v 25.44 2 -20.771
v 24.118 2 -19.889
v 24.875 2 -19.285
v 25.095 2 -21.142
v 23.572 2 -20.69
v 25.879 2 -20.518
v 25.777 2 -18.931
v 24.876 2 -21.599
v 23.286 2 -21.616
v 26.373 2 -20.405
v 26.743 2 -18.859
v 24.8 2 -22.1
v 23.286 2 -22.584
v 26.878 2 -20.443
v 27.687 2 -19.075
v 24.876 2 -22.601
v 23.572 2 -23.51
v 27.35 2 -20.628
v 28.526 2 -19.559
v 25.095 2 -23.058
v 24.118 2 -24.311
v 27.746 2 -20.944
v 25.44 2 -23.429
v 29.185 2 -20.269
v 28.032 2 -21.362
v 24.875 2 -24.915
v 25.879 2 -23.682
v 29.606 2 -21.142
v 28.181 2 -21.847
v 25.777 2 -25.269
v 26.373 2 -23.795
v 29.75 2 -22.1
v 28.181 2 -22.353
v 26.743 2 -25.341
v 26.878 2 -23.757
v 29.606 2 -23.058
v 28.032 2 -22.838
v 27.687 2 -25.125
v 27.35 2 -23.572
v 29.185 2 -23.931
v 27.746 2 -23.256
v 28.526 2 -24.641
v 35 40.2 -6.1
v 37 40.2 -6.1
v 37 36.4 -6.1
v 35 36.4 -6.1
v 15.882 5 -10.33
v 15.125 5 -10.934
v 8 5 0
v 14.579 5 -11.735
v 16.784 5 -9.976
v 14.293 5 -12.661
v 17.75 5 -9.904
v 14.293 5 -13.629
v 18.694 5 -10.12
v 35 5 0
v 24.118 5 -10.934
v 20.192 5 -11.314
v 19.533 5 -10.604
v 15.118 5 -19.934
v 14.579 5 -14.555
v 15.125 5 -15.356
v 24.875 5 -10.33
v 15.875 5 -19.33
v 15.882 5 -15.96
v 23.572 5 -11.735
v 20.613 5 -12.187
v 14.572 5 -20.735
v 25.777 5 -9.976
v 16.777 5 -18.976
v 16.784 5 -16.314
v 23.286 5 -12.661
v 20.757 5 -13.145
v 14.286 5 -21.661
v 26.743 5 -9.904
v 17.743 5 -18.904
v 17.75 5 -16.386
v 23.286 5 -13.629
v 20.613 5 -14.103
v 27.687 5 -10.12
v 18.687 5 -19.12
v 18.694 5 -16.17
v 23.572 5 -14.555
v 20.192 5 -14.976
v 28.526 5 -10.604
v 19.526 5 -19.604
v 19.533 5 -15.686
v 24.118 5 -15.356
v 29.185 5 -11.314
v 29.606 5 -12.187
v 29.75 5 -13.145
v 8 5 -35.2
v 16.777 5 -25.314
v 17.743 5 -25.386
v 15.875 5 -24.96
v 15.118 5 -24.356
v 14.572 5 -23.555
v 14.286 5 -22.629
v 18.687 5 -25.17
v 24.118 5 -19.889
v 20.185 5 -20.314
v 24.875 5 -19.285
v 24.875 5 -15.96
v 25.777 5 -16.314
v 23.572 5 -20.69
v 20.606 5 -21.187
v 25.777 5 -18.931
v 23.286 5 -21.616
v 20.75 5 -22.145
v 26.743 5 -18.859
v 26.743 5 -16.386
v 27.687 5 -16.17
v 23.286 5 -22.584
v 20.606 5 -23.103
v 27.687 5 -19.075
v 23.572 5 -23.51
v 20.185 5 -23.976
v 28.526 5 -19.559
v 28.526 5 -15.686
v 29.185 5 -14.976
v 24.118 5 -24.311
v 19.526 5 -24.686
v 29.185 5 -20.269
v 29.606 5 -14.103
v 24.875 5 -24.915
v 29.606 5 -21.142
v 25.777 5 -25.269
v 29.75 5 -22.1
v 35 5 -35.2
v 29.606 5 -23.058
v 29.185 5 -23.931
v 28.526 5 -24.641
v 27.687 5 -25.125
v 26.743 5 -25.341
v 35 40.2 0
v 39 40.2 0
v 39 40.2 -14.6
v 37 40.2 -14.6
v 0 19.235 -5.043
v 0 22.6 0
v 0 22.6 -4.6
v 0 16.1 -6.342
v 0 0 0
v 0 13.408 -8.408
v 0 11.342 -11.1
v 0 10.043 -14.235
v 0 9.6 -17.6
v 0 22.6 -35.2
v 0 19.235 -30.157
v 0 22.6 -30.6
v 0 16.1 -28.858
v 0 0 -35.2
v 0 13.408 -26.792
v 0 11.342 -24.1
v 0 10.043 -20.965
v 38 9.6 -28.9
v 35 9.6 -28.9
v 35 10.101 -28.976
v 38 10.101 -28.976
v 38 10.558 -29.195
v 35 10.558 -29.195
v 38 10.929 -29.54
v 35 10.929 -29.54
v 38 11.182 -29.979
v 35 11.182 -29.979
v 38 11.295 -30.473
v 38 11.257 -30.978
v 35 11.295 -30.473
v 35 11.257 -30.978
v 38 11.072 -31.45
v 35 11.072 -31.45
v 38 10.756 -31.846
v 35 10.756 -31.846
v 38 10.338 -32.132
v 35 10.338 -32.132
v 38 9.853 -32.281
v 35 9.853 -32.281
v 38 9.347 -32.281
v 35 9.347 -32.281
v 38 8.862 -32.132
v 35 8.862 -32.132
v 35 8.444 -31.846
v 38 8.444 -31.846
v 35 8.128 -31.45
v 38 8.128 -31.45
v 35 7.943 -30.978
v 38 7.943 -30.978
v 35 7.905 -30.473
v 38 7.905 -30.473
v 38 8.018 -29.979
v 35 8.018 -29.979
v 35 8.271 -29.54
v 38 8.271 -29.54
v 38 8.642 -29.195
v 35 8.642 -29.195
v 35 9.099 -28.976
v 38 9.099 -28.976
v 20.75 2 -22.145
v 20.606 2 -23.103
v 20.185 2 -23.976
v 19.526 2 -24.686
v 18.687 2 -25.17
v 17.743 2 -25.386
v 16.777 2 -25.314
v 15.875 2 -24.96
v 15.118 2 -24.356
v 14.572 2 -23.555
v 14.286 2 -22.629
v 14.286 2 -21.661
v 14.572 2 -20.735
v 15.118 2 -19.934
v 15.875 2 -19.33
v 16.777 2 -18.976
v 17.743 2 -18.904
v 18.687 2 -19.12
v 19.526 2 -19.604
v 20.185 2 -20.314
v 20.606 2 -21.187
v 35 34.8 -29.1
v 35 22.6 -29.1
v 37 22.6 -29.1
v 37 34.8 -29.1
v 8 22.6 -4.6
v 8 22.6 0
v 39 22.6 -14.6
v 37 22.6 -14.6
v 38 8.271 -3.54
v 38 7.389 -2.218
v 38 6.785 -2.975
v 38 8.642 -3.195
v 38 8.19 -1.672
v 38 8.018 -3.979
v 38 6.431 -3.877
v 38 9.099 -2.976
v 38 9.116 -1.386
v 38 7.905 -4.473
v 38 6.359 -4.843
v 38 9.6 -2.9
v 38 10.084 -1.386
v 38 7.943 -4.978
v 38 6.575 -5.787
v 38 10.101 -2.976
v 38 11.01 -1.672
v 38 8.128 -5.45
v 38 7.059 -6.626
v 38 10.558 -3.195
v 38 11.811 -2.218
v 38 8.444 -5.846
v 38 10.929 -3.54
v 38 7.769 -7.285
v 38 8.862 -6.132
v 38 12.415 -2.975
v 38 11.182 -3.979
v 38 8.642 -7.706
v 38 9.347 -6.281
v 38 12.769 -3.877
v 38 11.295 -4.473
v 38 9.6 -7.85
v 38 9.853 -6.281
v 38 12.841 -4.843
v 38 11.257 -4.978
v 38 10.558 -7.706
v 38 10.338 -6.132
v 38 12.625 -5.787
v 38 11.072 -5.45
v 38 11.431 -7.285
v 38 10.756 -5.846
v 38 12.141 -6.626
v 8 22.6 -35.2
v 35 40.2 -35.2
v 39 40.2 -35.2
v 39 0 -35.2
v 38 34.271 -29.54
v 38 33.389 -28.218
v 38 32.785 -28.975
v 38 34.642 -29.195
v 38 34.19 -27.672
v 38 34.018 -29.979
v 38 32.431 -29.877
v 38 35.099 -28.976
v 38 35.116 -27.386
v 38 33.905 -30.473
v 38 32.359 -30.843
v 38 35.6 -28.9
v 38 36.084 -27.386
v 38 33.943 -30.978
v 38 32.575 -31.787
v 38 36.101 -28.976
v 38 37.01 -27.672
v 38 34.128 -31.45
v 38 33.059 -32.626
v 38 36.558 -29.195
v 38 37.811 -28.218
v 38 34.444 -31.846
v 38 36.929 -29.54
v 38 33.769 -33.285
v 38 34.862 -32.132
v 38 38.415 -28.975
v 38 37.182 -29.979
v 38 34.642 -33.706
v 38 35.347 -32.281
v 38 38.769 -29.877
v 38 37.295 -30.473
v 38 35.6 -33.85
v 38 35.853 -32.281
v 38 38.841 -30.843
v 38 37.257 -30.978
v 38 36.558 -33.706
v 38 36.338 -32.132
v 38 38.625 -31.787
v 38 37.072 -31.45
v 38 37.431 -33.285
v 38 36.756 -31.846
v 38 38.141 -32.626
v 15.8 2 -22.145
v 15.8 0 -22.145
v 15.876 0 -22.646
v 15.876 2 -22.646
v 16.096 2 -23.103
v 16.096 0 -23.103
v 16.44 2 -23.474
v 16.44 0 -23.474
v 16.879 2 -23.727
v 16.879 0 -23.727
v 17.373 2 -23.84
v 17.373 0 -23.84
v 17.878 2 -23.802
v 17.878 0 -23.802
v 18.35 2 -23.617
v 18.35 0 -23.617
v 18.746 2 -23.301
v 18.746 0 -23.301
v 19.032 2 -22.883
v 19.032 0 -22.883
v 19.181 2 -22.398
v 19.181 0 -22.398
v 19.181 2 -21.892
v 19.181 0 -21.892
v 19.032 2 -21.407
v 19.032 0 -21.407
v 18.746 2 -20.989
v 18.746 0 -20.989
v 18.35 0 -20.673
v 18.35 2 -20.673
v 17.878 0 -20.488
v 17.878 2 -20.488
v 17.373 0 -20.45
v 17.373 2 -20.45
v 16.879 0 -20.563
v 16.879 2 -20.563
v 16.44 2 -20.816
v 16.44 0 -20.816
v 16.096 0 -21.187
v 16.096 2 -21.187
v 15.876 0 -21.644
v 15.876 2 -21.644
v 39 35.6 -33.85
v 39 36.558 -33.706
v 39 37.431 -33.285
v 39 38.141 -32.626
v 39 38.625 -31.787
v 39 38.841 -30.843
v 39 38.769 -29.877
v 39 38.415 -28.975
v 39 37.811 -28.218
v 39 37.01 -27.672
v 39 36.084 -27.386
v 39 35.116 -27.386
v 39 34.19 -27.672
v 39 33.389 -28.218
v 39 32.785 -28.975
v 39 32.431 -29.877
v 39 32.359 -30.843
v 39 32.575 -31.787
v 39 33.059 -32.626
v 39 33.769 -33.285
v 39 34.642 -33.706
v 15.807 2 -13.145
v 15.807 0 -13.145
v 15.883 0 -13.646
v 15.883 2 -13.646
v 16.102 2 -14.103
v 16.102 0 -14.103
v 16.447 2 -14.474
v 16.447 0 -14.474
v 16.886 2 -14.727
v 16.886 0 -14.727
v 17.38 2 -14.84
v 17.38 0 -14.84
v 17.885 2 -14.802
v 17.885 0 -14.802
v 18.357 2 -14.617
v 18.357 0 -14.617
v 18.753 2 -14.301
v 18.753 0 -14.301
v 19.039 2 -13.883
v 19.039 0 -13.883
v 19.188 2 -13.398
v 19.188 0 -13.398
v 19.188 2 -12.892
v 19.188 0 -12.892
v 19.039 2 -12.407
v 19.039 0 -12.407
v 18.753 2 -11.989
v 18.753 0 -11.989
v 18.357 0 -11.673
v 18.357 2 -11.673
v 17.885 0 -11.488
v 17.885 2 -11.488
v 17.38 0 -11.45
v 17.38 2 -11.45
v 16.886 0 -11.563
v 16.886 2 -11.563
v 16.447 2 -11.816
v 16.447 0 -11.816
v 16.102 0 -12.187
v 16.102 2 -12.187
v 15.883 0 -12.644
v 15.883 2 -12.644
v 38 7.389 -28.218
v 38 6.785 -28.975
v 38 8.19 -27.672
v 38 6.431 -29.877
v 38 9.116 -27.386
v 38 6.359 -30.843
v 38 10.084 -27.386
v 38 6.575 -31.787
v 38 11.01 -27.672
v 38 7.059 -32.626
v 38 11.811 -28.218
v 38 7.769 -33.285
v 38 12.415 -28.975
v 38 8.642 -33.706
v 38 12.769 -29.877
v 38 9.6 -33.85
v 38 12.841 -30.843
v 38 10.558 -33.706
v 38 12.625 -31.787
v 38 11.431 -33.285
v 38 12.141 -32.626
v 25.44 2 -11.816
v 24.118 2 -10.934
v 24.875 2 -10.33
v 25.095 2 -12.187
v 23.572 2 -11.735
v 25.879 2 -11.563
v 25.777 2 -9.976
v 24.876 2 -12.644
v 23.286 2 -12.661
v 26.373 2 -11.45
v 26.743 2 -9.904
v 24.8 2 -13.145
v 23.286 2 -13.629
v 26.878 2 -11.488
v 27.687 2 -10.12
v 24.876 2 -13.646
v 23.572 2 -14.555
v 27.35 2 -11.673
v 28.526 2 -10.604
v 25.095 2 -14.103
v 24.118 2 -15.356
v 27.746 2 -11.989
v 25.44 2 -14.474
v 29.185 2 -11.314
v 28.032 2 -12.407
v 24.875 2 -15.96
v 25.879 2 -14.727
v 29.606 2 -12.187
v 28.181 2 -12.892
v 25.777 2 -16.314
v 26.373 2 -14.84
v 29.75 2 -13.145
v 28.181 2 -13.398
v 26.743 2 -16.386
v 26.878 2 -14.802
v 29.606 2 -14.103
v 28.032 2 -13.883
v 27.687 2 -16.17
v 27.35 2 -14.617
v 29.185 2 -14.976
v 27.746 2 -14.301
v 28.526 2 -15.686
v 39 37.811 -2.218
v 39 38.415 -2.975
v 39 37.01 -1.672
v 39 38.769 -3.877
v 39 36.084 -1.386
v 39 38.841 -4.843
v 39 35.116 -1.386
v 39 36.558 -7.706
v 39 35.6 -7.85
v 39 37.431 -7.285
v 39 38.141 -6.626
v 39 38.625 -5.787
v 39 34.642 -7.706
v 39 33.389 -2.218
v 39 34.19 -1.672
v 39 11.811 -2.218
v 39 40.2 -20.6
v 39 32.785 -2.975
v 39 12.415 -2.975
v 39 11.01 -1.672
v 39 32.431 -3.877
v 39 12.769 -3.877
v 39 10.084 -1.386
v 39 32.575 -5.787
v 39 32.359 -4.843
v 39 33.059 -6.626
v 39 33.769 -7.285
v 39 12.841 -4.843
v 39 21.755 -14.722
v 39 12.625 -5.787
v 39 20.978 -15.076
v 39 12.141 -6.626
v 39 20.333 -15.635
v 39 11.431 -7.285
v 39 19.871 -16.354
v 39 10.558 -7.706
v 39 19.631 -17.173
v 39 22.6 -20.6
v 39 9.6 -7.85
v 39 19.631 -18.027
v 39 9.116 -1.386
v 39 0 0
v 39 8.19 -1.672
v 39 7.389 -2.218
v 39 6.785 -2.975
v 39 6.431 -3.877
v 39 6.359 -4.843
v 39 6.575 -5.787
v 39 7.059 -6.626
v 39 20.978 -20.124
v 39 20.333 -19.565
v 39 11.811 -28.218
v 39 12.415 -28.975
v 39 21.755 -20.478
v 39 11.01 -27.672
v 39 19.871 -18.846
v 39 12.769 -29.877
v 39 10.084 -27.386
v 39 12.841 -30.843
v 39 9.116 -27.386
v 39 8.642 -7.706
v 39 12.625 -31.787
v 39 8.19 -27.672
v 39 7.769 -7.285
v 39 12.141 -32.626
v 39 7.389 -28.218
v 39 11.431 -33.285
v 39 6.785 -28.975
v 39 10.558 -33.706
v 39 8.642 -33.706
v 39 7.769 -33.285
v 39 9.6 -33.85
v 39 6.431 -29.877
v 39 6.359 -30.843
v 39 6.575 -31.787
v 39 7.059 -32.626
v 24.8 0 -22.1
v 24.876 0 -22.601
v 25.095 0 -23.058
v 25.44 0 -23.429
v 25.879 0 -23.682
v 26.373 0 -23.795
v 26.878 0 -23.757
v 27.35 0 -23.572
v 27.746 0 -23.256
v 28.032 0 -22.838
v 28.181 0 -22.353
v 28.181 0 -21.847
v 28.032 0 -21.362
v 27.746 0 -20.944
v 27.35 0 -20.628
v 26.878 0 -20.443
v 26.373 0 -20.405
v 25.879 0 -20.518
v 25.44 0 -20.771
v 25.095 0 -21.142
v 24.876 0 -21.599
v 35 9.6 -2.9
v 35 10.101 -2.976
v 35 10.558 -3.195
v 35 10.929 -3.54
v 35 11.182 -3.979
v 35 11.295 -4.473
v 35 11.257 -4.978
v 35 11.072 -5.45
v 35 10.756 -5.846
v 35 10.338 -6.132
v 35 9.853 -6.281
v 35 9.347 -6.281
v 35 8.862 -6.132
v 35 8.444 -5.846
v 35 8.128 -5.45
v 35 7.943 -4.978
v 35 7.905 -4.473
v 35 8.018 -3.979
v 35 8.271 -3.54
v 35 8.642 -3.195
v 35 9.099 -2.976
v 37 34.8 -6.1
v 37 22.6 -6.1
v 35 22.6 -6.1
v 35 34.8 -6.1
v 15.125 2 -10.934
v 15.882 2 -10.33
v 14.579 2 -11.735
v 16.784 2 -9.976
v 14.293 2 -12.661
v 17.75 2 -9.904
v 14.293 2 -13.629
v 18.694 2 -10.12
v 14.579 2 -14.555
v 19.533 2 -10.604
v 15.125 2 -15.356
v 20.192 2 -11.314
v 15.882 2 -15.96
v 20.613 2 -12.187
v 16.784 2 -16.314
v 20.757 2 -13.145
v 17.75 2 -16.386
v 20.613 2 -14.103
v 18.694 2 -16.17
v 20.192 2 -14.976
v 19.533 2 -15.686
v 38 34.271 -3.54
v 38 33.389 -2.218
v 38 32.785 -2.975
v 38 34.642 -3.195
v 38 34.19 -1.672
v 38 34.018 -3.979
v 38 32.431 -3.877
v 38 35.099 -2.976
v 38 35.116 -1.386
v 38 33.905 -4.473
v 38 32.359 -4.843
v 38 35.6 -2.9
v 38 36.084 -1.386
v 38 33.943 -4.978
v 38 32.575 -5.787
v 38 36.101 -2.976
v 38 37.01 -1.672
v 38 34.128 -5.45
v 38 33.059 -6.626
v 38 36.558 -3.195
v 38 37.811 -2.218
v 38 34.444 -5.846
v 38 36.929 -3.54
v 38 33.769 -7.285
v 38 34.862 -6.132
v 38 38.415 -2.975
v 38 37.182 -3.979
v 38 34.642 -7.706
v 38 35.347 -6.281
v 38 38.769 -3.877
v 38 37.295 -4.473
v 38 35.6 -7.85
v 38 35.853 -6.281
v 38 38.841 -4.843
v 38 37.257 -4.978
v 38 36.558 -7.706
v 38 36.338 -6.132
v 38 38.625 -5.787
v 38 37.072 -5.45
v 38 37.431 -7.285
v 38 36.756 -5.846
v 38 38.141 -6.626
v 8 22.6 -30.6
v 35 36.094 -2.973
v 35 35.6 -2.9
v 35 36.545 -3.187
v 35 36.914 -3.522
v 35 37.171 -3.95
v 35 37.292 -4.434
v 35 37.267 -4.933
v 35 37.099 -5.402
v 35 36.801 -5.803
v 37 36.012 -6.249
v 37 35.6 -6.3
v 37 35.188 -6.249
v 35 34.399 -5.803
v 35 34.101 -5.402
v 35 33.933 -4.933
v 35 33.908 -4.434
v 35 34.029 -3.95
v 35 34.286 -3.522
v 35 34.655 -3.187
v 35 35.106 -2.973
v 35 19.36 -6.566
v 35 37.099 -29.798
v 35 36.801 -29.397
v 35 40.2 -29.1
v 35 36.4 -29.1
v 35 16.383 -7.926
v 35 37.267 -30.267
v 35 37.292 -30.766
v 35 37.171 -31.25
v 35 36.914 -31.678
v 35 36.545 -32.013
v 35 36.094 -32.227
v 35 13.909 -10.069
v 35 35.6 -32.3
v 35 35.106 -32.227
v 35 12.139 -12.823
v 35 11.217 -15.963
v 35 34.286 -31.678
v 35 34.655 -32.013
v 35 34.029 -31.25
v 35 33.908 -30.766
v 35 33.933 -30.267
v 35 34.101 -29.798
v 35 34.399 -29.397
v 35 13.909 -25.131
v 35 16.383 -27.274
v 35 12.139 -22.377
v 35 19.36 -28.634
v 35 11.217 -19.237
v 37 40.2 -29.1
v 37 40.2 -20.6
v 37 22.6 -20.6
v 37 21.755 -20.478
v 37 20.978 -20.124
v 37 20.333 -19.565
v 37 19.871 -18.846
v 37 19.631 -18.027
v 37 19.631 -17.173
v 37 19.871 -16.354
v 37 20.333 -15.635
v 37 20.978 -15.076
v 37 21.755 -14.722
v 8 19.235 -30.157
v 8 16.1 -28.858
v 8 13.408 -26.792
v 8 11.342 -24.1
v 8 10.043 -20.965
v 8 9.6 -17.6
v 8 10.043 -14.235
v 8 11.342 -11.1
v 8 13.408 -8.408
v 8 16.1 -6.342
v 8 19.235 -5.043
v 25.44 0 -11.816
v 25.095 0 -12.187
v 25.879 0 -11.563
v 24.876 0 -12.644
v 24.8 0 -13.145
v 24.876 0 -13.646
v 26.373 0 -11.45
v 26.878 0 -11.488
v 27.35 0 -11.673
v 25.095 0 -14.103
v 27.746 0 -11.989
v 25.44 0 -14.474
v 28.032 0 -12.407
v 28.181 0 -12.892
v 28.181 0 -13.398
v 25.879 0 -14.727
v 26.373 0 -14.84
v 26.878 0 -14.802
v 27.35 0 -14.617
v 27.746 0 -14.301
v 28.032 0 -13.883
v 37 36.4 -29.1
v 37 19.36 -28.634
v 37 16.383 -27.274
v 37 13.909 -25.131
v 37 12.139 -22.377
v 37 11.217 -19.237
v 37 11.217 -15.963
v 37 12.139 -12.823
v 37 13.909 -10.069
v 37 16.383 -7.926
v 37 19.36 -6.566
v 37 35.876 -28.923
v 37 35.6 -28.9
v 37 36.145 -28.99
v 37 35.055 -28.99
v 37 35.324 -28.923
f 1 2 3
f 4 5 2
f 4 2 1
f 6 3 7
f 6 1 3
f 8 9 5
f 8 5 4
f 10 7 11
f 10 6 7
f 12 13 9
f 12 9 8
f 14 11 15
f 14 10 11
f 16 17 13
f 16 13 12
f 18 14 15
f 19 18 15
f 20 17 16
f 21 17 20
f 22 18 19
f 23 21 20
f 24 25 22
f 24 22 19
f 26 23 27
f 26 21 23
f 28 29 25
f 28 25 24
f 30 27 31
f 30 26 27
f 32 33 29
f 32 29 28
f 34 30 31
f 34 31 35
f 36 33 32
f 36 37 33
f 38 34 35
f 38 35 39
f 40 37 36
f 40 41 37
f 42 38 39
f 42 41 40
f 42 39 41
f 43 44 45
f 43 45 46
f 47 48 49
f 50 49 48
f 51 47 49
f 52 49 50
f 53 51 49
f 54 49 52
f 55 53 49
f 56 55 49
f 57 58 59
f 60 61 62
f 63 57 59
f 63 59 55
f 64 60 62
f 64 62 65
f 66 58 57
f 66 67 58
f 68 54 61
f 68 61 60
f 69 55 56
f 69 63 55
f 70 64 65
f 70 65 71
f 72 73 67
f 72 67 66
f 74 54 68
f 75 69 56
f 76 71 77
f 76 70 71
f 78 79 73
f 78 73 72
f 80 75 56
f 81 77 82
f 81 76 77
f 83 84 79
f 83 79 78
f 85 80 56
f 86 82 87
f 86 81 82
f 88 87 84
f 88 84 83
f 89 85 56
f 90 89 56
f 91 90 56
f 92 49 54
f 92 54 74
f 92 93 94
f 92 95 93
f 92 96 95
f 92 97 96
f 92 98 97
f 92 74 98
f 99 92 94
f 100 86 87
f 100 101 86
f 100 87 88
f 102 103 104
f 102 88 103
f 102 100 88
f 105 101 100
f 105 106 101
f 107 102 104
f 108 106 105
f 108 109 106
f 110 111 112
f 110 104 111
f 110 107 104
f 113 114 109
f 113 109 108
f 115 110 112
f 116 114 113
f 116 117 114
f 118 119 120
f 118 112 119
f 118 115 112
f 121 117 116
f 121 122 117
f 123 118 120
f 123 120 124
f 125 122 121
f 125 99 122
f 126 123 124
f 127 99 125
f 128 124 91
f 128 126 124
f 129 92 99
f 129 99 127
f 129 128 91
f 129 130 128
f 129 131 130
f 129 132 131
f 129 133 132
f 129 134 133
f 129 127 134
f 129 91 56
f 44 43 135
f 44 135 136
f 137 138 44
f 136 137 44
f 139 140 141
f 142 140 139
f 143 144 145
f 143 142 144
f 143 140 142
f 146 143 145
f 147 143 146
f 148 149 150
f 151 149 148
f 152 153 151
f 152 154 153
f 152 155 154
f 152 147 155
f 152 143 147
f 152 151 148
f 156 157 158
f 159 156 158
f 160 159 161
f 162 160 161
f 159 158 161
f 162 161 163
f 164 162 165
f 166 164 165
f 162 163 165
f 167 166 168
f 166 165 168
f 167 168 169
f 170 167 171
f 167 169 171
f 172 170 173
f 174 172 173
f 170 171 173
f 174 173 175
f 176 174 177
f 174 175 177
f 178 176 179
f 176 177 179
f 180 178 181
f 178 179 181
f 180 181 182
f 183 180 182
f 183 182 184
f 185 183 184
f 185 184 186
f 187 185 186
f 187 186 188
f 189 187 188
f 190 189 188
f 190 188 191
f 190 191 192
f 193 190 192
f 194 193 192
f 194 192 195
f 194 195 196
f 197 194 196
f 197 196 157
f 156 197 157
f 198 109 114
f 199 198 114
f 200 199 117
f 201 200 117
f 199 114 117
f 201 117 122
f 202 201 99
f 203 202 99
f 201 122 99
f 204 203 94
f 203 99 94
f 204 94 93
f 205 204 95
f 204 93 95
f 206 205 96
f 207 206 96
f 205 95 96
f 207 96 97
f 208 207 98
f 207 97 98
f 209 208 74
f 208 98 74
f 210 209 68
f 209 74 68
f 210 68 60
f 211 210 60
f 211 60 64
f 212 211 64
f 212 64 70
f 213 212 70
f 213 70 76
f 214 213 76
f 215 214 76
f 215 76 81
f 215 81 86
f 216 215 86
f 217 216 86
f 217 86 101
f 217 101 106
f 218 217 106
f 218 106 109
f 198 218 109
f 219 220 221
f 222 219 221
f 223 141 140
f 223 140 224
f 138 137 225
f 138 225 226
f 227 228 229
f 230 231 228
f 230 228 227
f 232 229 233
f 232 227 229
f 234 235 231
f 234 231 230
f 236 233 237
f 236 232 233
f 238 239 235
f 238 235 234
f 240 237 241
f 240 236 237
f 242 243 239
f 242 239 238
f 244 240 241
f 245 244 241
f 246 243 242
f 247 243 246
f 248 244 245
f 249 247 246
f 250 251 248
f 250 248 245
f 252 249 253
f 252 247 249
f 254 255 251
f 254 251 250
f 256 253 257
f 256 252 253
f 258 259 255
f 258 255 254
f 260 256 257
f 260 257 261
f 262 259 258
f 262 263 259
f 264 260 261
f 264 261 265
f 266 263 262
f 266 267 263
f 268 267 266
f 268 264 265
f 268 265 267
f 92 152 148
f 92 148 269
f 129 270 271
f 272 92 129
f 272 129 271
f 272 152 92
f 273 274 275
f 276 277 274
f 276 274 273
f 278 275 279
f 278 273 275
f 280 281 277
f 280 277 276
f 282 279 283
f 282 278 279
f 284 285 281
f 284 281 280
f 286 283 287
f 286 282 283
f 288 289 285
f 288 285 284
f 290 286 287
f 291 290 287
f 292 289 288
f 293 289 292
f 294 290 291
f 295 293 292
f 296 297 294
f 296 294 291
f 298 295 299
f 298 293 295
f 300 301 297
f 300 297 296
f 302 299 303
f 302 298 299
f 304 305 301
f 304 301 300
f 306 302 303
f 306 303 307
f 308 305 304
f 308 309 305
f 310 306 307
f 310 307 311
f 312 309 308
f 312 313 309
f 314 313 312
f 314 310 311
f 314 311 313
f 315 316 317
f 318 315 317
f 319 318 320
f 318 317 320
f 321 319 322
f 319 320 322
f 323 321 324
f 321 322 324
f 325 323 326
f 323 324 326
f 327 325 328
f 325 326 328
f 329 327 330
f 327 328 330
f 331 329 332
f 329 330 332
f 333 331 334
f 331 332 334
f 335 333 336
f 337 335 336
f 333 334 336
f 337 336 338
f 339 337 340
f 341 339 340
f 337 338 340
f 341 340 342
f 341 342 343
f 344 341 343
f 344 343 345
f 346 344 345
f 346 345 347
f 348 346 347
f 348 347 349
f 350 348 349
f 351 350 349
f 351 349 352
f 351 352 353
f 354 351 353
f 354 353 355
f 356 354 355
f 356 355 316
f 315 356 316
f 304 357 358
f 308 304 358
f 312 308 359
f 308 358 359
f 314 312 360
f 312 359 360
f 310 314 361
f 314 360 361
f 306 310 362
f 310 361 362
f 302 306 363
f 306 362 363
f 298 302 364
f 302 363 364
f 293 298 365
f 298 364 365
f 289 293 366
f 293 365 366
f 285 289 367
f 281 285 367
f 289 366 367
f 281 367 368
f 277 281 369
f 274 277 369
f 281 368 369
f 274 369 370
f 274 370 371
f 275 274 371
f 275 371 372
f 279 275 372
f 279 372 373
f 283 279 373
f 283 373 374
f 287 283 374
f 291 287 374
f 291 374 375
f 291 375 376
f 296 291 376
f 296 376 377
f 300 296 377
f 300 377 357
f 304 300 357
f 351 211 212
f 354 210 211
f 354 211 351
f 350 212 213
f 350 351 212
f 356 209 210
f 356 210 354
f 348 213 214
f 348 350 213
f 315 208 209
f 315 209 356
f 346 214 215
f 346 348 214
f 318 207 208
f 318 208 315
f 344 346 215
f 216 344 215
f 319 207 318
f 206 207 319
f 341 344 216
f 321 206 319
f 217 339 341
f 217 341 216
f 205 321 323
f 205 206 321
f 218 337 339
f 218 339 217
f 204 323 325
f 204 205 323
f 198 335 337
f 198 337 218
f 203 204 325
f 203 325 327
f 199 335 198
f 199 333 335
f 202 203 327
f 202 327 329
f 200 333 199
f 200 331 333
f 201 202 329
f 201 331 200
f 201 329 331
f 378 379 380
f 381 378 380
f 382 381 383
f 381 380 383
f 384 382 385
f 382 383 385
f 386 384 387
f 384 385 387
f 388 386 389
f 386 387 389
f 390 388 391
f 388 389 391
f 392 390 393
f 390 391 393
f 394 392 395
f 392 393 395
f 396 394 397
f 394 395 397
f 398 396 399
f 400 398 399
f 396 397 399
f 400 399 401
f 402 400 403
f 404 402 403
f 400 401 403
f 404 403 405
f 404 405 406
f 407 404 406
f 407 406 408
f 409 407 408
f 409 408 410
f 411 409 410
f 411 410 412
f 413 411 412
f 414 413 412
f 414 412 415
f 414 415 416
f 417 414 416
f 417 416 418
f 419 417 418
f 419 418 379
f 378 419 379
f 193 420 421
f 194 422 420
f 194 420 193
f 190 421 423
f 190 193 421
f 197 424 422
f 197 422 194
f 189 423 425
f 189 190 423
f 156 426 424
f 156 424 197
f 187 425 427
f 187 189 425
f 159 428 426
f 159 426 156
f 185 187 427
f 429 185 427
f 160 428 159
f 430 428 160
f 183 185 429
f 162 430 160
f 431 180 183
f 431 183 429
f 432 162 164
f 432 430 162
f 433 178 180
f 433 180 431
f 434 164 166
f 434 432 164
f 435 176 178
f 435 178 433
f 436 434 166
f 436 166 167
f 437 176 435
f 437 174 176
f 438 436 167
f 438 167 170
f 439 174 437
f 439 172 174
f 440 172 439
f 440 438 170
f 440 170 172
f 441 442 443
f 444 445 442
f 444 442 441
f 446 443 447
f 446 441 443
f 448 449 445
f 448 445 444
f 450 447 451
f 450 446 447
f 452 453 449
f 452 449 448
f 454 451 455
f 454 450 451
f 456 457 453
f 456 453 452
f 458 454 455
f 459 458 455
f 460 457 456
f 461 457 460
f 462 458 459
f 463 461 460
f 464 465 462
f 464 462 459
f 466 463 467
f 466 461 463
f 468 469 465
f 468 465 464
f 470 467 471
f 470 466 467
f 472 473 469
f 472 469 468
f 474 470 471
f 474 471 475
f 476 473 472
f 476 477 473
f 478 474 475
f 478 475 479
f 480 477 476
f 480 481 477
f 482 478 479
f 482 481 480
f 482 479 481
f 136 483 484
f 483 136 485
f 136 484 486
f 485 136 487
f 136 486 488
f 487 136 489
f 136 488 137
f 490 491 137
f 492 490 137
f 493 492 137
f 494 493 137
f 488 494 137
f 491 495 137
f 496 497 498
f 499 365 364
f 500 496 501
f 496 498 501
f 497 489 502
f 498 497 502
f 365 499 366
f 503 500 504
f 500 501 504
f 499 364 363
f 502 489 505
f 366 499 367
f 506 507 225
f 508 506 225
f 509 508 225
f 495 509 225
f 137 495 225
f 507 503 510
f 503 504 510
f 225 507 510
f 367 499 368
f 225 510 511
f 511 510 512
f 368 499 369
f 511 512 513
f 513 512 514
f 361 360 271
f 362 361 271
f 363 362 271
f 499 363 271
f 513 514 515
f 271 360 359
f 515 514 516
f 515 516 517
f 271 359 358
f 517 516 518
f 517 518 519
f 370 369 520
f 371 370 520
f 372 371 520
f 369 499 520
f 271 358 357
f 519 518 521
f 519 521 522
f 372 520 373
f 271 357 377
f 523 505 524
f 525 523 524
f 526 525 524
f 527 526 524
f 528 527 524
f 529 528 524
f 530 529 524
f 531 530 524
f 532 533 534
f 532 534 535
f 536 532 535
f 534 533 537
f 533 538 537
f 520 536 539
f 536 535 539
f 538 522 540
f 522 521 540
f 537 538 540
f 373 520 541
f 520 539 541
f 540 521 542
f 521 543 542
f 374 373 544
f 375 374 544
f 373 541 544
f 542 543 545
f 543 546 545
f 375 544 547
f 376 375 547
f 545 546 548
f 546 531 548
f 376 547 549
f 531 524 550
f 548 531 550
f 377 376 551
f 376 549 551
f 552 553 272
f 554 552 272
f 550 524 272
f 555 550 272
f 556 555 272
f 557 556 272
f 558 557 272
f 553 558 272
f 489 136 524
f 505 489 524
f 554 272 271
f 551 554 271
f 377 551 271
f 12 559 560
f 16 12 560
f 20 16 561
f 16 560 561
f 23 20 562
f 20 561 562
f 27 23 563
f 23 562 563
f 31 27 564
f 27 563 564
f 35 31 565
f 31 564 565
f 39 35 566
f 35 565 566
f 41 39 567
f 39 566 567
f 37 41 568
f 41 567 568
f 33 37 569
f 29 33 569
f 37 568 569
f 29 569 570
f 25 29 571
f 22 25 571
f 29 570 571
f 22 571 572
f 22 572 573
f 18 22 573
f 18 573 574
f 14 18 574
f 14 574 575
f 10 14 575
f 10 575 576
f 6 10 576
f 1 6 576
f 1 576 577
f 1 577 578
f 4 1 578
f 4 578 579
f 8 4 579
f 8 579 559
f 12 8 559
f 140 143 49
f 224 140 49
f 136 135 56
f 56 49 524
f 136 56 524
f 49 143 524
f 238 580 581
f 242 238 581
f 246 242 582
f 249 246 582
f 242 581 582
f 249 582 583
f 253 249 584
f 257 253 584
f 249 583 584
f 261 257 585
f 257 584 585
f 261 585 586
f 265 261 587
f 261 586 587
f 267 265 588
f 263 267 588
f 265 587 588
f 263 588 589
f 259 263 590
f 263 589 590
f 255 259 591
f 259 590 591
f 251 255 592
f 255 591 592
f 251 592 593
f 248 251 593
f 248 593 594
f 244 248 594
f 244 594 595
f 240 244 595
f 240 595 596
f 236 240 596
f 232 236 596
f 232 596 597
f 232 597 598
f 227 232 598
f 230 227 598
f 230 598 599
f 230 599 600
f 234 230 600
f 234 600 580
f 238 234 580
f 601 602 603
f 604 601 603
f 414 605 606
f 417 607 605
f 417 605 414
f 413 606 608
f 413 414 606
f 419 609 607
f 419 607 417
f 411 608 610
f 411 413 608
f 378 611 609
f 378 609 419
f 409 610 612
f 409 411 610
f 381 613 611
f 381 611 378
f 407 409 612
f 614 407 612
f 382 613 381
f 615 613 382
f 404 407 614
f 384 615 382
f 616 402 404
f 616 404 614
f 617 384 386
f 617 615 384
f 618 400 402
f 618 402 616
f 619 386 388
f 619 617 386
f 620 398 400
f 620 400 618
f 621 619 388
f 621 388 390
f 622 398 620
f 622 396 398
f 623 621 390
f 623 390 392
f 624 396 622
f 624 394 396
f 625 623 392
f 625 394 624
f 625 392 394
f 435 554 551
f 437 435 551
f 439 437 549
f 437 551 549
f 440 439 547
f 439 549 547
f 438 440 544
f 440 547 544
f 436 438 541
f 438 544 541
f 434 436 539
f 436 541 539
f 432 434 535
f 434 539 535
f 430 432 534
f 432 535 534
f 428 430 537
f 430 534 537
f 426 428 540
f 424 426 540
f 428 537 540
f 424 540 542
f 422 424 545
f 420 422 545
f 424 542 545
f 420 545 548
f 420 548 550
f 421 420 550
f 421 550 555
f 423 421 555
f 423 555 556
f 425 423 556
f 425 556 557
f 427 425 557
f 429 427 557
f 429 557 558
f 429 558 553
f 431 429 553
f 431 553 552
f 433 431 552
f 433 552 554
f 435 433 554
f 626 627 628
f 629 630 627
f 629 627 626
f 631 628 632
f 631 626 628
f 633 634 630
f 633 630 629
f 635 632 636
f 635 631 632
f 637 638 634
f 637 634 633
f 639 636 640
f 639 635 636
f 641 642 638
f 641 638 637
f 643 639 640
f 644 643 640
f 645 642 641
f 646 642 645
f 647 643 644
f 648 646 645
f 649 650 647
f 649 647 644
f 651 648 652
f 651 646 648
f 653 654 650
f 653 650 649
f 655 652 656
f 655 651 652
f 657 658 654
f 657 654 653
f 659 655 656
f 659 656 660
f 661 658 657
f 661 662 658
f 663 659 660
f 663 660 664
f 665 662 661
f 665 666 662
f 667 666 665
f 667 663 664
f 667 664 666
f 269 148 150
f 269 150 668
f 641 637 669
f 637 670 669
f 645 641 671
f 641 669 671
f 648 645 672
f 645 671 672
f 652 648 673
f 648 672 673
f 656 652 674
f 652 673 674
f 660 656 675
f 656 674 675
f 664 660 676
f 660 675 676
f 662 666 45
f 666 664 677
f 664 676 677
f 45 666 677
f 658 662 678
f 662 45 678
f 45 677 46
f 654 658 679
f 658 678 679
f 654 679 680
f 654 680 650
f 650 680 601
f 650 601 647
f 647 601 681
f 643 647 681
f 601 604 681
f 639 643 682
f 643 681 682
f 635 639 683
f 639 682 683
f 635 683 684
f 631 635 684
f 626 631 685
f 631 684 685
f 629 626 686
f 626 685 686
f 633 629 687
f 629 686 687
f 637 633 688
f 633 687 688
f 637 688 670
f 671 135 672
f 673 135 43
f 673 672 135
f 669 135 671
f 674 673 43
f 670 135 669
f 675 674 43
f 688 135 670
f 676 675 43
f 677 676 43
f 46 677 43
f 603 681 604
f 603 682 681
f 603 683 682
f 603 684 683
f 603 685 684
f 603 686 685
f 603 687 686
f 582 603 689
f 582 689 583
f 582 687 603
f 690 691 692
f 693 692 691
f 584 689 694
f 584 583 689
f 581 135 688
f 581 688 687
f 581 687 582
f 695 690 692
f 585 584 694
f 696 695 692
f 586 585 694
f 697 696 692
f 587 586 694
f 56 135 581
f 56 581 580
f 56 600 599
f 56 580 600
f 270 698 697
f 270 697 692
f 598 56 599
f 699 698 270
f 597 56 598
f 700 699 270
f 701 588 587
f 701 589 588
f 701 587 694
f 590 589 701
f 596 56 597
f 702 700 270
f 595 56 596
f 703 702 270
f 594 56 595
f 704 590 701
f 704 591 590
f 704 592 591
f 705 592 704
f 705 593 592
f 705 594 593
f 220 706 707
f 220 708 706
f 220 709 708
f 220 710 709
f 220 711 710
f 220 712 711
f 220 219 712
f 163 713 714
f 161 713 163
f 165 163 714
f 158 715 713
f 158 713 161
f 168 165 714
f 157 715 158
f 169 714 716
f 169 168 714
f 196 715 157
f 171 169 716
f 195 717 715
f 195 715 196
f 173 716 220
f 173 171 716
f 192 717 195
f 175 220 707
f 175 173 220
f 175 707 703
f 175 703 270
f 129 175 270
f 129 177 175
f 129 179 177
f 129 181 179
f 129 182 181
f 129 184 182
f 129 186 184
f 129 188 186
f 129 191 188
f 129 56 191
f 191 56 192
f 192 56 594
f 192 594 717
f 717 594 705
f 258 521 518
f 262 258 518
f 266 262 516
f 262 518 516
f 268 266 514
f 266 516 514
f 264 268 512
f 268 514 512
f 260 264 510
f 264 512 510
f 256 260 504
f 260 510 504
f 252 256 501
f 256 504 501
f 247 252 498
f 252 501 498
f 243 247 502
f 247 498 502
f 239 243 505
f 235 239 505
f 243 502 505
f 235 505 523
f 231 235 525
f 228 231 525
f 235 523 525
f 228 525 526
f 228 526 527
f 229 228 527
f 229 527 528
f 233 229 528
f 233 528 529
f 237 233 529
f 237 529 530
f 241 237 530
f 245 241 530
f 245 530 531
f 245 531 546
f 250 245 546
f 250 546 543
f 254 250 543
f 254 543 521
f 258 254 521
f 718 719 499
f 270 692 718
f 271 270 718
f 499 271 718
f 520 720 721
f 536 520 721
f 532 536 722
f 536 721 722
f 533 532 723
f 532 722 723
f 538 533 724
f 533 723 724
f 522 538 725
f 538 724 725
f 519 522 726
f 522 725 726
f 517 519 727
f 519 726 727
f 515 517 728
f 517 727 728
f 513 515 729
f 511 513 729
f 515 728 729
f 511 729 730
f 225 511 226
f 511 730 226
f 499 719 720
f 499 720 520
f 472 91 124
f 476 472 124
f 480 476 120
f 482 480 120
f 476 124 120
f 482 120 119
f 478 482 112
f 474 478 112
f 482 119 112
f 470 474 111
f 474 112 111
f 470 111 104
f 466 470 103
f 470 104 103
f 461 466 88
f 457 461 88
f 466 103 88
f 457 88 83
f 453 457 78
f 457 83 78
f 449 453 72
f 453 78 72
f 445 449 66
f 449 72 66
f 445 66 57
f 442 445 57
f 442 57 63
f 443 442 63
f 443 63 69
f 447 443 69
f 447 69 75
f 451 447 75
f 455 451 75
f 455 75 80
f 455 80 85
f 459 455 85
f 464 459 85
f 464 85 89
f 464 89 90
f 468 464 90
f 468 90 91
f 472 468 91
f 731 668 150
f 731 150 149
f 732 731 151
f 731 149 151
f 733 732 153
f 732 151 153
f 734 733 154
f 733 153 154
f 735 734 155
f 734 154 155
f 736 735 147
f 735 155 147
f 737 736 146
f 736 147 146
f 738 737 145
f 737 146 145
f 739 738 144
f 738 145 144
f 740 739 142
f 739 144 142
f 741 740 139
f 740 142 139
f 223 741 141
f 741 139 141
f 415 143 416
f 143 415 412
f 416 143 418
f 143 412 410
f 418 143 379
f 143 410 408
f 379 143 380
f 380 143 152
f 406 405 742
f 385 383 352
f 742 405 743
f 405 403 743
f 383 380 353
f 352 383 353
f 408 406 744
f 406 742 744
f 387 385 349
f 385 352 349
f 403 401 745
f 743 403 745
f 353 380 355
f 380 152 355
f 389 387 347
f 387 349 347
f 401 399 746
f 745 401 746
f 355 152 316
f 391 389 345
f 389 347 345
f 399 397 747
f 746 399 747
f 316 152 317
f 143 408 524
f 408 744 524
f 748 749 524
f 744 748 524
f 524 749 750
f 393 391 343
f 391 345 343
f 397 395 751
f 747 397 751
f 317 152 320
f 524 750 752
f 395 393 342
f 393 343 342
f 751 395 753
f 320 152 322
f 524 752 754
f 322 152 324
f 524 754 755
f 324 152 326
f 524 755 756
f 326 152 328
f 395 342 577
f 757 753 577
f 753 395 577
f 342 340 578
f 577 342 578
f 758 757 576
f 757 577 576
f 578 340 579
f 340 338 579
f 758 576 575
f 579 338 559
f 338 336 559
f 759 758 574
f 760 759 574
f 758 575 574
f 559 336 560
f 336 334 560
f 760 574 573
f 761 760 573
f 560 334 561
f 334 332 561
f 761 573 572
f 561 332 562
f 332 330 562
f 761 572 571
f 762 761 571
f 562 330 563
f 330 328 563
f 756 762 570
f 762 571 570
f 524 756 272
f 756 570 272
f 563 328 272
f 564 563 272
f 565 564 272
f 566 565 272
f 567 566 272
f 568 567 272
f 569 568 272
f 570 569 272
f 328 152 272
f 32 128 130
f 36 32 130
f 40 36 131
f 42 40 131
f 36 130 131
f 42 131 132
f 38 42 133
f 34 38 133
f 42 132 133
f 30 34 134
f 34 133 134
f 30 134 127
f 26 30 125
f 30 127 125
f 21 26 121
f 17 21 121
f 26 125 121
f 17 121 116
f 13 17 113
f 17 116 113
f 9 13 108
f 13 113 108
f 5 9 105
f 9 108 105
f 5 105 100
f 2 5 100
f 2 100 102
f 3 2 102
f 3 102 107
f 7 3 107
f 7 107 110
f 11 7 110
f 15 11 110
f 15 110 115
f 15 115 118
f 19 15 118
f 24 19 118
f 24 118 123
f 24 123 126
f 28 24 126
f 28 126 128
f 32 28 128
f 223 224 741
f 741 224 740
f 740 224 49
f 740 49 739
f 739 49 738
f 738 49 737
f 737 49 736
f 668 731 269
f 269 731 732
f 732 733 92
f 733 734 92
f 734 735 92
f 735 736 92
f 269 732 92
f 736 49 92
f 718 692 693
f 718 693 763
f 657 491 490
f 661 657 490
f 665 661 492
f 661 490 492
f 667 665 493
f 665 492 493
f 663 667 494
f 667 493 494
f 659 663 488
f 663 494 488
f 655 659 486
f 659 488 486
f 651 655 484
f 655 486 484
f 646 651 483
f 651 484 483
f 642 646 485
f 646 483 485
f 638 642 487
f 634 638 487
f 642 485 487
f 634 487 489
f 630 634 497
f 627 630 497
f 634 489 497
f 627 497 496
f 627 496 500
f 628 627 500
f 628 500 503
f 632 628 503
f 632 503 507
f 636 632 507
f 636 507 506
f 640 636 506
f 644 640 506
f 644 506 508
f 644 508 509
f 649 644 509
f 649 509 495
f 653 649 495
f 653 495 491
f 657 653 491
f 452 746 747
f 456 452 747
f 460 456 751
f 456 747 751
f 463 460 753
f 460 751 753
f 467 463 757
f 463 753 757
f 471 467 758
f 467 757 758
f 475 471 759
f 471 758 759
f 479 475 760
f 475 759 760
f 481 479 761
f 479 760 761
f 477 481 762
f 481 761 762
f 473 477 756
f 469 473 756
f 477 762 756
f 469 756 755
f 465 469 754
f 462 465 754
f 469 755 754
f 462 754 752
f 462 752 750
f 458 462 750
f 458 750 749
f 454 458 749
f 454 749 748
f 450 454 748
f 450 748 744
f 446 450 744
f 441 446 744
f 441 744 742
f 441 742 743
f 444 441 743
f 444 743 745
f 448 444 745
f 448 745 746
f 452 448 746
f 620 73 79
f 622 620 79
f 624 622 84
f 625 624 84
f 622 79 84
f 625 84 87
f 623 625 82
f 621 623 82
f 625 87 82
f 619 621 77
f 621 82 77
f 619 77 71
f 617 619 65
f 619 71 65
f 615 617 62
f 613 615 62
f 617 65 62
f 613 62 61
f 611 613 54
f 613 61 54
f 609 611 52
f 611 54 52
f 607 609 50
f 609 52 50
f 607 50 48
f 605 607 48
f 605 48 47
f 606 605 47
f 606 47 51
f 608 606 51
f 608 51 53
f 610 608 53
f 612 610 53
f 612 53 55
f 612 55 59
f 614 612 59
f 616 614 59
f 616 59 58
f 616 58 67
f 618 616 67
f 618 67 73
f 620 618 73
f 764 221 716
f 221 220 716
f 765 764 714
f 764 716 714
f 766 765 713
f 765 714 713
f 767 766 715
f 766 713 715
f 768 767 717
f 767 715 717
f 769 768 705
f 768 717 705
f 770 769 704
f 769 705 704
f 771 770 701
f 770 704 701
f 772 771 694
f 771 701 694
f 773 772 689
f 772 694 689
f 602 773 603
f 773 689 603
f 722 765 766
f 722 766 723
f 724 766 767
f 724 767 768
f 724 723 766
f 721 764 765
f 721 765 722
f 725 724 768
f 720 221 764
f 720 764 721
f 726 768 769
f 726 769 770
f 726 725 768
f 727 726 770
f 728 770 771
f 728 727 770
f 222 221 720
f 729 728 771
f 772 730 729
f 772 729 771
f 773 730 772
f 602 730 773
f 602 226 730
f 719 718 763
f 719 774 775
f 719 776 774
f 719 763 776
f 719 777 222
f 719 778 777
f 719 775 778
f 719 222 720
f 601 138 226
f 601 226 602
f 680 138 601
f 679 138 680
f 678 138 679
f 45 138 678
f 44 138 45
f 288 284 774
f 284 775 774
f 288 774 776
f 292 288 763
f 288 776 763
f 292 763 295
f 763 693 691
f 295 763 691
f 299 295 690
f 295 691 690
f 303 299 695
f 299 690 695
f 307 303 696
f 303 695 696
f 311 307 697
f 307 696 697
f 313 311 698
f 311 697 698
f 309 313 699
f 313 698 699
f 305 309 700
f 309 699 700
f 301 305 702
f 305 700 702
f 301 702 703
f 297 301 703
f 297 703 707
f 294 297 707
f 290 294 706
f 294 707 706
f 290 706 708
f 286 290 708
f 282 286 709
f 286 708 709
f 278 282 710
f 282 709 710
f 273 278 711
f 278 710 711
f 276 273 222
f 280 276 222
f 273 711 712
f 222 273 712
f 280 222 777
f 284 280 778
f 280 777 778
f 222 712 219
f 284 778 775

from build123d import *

# Parameters (mm, degrees)
SKETCH1_W                      = 39
SKETCH1_H                      = 35.2
BOSS_EXTRUDE1_DEPTH            = 5
SKETCH2_W                      = 8
SKETCH2_H                      = 35.2
BOSS_EXTRUDE2_DEPTH            = 35.2
SKETCH3_W                      = 4
SKETCH3_H                      = 35.2
BOSS_EXTRUDE3_DEPTH            = 35.2
CUT_EXTRUDE2_REACH             = 41
SKETCH5_R                      = 13
CBORE_FOR_M3_SHCS1_D           = 3.4
CBORE_FOR_M3_SHCS1_DEPTH       = 5
CBORE_FOR_M3_SHCS1_CBORE_D     = 6.5
CBORE_FOR_M3_SHCS1_CBORE_DEPTH = 3
CUT_EXTRUDE3_DEPTH             = 17.6
SKETCH13_R                     = 3
CUT_EXTRUDE5_DEPTH             = 5
SKETCH14_R                     = 11.5
CUT_EXTRUDE6_DEPTH             = 2
CBORE_FOR_M3_SHCS2_D           = 3.4
CBORE_FOR_M3_SHCS2_DEPTH       = 4
CBORE_FOR_M3_SHCS2_CBORE_D     = 6.5
CBORE_FOR_M3_SHCS2_CBORE_DEPTH = 1
SKETCH17_W                     = 8
SKETCH17_H                     = 35.2
CUT_EXTRUDE7_DEPTH             = 17.6


with BuildPart() as part:
    # Sketch1 → Boss-Extrude1 (new body)
    with BuildSketch(Plane(origin=(0, 0, 0), x_dir=(1, 0, 0), z_dir=(0, 1, 0))):
        with Locations((19.5, 17.6)):
            Rectangle(SKETCH1_W, SKETCH1_H)
    extrude(amount=BOSS_EXTRUDE1_DEPTH)

    # Sketch2 → Boss-Extrude2 (add)
    with BuildSketch(Plane(origin=(0, 5, 0), x_dir=(1, 0, 0), z_dir=(0, 1, 0))):
        with Locations((4, 17.6)):
            Rectangle(SKETCH2_W, SKETCH2_H)
    extrude(amount=BOSS_EXTRUDE2_DEPTH)

    # Sketch3 → Boss-Extrude3 (add)
    with BuildSketch(Plane(origin=(0, 5, 0), x_dir=(1, 0, 0), z_dir=(0, 1, 0))):
        with Locations((37, 17.6)):
            Rectangle(SKETCH3_W, SKETCH3_H)
    extrude(amount=BOSS_EXTRUDE3_DEPTH)

    # Sketch5 → Cut-Extrude2 (cut, up to next)
    with BuildSketch(Plane.ZY, mode=Mode.PRIVATE) as cut_extrude2_sk1:
        with Locations((-17.6, 22.6)):
            Circle(SKETCH5_R)
    cut_extrude2_tool1 = extrude(cut_extrude2_sk1.sketch, amount=-CUT_EXTRUDE2_REACH, mode=Mode.PRIVATE) & part.part
    add(cut_extrude2_tool1.solids().sort_by_distance((0, 22.6, -17.6))[0], mode=Mode.SUBTRACT)

    # CBORE for M3 SHCS1
    with Locations(Plane(origin=(0, 5, 0), x_dir=(1, 0, 0), z_dir=(0, 1, 0))):
        with Locations((17.506975999, 13.145005862), (17.500112517, 22.145003245), (26.5, 22.1), (26.5, 13.145005862)):
            CounterBoreHole(CBORE_FOR_M3_SHCS1_D / 2, CBORE_FOR_M3_SHCS1_CBORE_D / 2, CBORE_FOR_M3_SHCS1_CBORE_DEPTH, depth=CBORE_FOR_M3_SHCS1_DEPTH)

    # Sketch10 → Cut-Extrude3 (cut)
    with BuildSketch(Plane(origin=(0, 40.2, 0), x_dir=(1, 0, 0), z_dir=(0, 1, 0))):
        Polygon((37, 20.6), (39, 20.6), (39, 14.6), (37, 14.6), (37, 6.1), (35, 6.1), (35, 29.1), (37, 29.1), align=None)
    extrude(amount=-CUT_EXTRUDE3_DEPTH, mode=Mode.SUBTRACT)

    # Sketch13 → Cut-Extrude5 (cut, through all)
    with BuildSketch(Plane.ZY.offset(-35)):
        with Locations((-17.6, 22.6)):
            Circle(SKETCH13_R)
    extrude(amount=-CUT_EXTRUDE5_DEPTH, mode=Mode.SUBTRACT)

    # Sketch14 → Cut-Extrude6 (cut)
    with BuildSketch(Plane.ZY.offset(-35)):
        with Locations((-17.6, 22.6)):
            Circle(SKETCH14_R)
    extrude(amount=-CUT_EXTRUDE6_DEPTH, mode=Mode.SUBTRACT)

    # CBORE for M3 SHCS2
    with Locations(Plane(origin=(39, 0, 0), x_dir=(0, 0, -1), z_dir=(1, 0, 0))):
        with Locations((30.6, 35.6), (30.6, 9.6), (4.6, 9.6), (4.6, 35.6)):
            CounterBoreHole(CBORE_FOR_M3_SHCS2_D / 2, CBORE_FOR_M3_SHCS2_CBORE_D / 2, CBORE_FOR_M3_SHCS2_CBORE_DEPTH, depth=CBORE_FOR_M3_SHCS2_DEPTH)

    # Sketch17 → Cut-Extrude7 (cut)
    with BuildSketch(Plane(origin=(0, 40.2, 0), x_dir=(1, 0, 0), z_dir=(0, 1, 0))):
        with Locations((4, 17.6)):
            Rectangle(SKETCH17_W, SKETCH17_H)
    extrude(amount=-CUT_EXTRUDE7_DEPTH, mode=Mode.SUBTRACT)


solid = part.part
